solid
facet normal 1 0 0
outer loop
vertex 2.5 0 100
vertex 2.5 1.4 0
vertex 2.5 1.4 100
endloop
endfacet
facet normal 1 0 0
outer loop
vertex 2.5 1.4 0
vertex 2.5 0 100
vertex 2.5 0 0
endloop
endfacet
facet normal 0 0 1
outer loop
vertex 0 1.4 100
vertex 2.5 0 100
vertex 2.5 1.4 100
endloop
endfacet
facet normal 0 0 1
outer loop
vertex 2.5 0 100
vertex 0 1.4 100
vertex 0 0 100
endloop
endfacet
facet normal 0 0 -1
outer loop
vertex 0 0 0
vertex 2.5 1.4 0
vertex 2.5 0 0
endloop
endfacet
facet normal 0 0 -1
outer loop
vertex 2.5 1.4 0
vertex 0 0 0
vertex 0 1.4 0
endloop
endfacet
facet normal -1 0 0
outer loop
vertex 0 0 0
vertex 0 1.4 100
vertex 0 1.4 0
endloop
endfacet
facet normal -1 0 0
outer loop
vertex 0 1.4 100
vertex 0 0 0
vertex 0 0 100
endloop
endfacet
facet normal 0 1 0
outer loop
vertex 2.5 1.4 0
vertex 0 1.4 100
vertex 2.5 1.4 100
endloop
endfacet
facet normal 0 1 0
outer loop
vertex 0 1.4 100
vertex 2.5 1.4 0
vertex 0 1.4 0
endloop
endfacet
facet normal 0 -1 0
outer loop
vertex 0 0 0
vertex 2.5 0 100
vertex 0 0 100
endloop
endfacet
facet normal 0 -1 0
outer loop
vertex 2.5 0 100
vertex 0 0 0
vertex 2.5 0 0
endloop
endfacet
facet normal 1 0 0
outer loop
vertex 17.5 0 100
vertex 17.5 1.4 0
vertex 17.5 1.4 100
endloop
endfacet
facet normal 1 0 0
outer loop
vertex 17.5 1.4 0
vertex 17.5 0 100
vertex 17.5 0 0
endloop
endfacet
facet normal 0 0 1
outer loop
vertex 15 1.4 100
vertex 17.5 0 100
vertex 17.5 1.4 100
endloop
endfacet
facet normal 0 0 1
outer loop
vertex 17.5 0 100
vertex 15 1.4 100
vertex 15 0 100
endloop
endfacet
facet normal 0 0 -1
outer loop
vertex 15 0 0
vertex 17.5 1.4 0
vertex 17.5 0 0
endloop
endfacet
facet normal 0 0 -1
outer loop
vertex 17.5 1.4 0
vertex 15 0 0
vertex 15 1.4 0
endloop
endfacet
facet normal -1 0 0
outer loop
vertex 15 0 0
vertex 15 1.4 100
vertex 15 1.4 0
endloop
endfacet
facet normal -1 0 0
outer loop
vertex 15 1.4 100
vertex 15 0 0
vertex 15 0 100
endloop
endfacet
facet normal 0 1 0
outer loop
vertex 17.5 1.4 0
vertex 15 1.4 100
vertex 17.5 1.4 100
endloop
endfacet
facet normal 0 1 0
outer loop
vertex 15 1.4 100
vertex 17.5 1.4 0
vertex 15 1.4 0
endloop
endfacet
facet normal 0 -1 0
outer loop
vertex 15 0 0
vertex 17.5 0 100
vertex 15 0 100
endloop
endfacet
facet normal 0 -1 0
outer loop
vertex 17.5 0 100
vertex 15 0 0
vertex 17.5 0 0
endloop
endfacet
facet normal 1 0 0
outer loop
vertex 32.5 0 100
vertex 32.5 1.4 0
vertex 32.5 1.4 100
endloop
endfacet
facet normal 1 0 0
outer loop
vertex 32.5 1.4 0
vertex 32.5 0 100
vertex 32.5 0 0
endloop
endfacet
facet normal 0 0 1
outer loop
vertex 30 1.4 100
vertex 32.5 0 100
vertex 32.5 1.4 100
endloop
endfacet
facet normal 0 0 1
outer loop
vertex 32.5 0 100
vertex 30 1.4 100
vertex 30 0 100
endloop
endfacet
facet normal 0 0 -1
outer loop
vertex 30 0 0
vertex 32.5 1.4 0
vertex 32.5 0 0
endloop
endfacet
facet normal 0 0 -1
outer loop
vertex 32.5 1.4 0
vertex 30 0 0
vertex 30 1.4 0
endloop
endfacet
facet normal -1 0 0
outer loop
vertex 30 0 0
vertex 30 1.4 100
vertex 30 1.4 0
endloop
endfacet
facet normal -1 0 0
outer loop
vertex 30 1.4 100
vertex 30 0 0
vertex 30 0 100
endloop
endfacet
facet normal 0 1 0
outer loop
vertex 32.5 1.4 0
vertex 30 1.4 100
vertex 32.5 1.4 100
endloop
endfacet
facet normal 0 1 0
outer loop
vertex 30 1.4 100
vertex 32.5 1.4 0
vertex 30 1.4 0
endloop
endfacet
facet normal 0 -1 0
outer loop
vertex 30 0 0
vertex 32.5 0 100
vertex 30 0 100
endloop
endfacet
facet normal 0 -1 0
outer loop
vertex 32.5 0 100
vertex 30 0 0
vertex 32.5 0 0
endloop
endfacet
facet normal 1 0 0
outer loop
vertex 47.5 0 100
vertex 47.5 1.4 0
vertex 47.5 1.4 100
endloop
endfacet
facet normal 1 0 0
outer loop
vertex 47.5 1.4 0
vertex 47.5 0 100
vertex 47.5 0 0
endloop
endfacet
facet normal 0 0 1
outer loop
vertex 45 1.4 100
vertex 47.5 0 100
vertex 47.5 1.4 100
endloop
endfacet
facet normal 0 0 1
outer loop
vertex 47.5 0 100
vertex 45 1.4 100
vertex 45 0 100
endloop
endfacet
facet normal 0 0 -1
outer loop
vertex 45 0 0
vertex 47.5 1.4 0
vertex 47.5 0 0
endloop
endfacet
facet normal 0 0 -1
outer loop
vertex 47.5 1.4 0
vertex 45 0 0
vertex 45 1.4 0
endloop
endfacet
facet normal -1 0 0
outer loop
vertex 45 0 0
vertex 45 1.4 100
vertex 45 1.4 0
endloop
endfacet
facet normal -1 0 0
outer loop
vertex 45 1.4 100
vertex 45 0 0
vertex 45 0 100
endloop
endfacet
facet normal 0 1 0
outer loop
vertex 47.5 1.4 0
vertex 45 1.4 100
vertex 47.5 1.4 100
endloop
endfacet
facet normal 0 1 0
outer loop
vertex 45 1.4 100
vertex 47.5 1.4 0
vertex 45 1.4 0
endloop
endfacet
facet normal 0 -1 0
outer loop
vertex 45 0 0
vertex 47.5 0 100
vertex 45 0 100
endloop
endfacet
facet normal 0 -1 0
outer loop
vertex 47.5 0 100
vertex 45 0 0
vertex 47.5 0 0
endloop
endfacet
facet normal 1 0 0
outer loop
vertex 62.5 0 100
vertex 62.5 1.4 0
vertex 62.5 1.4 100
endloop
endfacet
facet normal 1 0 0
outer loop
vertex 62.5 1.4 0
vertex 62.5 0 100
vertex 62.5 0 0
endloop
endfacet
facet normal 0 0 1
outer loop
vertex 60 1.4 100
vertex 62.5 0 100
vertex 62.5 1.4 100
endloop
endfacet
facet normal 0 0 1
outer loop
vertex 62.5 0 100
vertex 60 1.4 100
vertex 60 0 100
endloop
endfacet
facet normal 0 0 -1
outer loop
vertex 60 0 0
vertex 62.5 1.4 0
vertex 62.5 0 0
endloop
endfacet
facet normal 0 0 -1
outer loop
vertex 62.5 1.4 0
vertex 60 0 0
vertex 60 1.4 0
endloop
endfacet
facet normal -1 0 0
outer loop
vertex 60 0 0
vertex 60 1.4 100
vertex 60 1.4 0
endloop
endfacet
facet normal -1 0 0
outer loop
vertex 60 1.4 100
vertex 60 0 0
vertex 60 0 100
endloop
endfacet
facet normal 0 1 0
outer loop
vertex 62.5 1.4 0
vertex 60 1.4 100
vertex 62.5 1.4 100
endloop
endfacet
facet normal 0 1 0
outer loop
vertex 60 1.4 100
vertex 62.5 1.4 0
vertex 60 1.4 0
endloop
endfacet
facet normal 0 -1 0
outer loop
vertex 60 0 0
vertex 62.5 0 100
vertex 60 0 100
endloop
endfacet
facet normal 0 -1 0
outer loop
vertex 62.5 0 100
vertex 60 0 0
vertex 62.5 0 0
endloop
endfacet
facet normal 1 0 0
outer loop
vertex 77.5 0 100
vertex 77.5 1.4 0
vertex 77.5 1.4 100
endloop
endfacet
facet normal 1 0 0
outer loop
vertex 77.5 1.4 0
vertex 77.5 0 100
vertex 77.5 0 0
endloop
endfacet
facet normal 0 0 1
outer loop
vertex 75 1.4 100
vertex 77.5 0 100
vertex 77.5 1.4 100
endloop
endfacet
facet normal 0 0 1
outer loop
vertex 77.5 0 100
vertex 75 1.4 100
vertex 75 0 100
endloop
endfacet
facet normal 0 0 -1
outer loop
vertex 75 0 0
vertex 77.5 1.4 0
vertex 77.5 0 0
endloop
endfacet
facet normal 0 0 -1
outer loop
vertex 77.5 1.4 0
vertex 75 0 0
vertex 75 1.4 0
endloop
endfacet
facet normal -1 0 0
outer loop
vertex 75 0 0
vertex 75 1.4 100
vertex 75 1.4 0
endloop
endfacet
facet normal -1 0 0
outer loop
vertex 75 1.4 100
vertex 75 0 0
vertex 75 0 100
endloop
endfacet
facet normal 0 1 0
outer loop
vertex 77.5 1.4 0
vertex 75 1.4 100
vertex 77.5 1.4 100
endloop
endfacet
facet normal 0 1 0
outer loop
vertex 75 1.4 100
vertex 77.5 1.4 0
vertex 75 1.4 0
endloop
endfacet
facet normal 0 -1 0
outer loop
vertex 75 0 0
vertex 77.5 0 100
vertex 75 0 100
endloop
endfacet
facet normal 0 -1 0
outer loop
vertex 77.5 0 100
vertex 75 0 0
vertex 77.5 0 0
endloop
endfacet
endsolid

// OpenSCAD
width = 2.5;
thick = 1.4;
length = 100;

for (i = [0:15:75]) {
    translate([i,0,0]) cube([width, thick, length]);
}
